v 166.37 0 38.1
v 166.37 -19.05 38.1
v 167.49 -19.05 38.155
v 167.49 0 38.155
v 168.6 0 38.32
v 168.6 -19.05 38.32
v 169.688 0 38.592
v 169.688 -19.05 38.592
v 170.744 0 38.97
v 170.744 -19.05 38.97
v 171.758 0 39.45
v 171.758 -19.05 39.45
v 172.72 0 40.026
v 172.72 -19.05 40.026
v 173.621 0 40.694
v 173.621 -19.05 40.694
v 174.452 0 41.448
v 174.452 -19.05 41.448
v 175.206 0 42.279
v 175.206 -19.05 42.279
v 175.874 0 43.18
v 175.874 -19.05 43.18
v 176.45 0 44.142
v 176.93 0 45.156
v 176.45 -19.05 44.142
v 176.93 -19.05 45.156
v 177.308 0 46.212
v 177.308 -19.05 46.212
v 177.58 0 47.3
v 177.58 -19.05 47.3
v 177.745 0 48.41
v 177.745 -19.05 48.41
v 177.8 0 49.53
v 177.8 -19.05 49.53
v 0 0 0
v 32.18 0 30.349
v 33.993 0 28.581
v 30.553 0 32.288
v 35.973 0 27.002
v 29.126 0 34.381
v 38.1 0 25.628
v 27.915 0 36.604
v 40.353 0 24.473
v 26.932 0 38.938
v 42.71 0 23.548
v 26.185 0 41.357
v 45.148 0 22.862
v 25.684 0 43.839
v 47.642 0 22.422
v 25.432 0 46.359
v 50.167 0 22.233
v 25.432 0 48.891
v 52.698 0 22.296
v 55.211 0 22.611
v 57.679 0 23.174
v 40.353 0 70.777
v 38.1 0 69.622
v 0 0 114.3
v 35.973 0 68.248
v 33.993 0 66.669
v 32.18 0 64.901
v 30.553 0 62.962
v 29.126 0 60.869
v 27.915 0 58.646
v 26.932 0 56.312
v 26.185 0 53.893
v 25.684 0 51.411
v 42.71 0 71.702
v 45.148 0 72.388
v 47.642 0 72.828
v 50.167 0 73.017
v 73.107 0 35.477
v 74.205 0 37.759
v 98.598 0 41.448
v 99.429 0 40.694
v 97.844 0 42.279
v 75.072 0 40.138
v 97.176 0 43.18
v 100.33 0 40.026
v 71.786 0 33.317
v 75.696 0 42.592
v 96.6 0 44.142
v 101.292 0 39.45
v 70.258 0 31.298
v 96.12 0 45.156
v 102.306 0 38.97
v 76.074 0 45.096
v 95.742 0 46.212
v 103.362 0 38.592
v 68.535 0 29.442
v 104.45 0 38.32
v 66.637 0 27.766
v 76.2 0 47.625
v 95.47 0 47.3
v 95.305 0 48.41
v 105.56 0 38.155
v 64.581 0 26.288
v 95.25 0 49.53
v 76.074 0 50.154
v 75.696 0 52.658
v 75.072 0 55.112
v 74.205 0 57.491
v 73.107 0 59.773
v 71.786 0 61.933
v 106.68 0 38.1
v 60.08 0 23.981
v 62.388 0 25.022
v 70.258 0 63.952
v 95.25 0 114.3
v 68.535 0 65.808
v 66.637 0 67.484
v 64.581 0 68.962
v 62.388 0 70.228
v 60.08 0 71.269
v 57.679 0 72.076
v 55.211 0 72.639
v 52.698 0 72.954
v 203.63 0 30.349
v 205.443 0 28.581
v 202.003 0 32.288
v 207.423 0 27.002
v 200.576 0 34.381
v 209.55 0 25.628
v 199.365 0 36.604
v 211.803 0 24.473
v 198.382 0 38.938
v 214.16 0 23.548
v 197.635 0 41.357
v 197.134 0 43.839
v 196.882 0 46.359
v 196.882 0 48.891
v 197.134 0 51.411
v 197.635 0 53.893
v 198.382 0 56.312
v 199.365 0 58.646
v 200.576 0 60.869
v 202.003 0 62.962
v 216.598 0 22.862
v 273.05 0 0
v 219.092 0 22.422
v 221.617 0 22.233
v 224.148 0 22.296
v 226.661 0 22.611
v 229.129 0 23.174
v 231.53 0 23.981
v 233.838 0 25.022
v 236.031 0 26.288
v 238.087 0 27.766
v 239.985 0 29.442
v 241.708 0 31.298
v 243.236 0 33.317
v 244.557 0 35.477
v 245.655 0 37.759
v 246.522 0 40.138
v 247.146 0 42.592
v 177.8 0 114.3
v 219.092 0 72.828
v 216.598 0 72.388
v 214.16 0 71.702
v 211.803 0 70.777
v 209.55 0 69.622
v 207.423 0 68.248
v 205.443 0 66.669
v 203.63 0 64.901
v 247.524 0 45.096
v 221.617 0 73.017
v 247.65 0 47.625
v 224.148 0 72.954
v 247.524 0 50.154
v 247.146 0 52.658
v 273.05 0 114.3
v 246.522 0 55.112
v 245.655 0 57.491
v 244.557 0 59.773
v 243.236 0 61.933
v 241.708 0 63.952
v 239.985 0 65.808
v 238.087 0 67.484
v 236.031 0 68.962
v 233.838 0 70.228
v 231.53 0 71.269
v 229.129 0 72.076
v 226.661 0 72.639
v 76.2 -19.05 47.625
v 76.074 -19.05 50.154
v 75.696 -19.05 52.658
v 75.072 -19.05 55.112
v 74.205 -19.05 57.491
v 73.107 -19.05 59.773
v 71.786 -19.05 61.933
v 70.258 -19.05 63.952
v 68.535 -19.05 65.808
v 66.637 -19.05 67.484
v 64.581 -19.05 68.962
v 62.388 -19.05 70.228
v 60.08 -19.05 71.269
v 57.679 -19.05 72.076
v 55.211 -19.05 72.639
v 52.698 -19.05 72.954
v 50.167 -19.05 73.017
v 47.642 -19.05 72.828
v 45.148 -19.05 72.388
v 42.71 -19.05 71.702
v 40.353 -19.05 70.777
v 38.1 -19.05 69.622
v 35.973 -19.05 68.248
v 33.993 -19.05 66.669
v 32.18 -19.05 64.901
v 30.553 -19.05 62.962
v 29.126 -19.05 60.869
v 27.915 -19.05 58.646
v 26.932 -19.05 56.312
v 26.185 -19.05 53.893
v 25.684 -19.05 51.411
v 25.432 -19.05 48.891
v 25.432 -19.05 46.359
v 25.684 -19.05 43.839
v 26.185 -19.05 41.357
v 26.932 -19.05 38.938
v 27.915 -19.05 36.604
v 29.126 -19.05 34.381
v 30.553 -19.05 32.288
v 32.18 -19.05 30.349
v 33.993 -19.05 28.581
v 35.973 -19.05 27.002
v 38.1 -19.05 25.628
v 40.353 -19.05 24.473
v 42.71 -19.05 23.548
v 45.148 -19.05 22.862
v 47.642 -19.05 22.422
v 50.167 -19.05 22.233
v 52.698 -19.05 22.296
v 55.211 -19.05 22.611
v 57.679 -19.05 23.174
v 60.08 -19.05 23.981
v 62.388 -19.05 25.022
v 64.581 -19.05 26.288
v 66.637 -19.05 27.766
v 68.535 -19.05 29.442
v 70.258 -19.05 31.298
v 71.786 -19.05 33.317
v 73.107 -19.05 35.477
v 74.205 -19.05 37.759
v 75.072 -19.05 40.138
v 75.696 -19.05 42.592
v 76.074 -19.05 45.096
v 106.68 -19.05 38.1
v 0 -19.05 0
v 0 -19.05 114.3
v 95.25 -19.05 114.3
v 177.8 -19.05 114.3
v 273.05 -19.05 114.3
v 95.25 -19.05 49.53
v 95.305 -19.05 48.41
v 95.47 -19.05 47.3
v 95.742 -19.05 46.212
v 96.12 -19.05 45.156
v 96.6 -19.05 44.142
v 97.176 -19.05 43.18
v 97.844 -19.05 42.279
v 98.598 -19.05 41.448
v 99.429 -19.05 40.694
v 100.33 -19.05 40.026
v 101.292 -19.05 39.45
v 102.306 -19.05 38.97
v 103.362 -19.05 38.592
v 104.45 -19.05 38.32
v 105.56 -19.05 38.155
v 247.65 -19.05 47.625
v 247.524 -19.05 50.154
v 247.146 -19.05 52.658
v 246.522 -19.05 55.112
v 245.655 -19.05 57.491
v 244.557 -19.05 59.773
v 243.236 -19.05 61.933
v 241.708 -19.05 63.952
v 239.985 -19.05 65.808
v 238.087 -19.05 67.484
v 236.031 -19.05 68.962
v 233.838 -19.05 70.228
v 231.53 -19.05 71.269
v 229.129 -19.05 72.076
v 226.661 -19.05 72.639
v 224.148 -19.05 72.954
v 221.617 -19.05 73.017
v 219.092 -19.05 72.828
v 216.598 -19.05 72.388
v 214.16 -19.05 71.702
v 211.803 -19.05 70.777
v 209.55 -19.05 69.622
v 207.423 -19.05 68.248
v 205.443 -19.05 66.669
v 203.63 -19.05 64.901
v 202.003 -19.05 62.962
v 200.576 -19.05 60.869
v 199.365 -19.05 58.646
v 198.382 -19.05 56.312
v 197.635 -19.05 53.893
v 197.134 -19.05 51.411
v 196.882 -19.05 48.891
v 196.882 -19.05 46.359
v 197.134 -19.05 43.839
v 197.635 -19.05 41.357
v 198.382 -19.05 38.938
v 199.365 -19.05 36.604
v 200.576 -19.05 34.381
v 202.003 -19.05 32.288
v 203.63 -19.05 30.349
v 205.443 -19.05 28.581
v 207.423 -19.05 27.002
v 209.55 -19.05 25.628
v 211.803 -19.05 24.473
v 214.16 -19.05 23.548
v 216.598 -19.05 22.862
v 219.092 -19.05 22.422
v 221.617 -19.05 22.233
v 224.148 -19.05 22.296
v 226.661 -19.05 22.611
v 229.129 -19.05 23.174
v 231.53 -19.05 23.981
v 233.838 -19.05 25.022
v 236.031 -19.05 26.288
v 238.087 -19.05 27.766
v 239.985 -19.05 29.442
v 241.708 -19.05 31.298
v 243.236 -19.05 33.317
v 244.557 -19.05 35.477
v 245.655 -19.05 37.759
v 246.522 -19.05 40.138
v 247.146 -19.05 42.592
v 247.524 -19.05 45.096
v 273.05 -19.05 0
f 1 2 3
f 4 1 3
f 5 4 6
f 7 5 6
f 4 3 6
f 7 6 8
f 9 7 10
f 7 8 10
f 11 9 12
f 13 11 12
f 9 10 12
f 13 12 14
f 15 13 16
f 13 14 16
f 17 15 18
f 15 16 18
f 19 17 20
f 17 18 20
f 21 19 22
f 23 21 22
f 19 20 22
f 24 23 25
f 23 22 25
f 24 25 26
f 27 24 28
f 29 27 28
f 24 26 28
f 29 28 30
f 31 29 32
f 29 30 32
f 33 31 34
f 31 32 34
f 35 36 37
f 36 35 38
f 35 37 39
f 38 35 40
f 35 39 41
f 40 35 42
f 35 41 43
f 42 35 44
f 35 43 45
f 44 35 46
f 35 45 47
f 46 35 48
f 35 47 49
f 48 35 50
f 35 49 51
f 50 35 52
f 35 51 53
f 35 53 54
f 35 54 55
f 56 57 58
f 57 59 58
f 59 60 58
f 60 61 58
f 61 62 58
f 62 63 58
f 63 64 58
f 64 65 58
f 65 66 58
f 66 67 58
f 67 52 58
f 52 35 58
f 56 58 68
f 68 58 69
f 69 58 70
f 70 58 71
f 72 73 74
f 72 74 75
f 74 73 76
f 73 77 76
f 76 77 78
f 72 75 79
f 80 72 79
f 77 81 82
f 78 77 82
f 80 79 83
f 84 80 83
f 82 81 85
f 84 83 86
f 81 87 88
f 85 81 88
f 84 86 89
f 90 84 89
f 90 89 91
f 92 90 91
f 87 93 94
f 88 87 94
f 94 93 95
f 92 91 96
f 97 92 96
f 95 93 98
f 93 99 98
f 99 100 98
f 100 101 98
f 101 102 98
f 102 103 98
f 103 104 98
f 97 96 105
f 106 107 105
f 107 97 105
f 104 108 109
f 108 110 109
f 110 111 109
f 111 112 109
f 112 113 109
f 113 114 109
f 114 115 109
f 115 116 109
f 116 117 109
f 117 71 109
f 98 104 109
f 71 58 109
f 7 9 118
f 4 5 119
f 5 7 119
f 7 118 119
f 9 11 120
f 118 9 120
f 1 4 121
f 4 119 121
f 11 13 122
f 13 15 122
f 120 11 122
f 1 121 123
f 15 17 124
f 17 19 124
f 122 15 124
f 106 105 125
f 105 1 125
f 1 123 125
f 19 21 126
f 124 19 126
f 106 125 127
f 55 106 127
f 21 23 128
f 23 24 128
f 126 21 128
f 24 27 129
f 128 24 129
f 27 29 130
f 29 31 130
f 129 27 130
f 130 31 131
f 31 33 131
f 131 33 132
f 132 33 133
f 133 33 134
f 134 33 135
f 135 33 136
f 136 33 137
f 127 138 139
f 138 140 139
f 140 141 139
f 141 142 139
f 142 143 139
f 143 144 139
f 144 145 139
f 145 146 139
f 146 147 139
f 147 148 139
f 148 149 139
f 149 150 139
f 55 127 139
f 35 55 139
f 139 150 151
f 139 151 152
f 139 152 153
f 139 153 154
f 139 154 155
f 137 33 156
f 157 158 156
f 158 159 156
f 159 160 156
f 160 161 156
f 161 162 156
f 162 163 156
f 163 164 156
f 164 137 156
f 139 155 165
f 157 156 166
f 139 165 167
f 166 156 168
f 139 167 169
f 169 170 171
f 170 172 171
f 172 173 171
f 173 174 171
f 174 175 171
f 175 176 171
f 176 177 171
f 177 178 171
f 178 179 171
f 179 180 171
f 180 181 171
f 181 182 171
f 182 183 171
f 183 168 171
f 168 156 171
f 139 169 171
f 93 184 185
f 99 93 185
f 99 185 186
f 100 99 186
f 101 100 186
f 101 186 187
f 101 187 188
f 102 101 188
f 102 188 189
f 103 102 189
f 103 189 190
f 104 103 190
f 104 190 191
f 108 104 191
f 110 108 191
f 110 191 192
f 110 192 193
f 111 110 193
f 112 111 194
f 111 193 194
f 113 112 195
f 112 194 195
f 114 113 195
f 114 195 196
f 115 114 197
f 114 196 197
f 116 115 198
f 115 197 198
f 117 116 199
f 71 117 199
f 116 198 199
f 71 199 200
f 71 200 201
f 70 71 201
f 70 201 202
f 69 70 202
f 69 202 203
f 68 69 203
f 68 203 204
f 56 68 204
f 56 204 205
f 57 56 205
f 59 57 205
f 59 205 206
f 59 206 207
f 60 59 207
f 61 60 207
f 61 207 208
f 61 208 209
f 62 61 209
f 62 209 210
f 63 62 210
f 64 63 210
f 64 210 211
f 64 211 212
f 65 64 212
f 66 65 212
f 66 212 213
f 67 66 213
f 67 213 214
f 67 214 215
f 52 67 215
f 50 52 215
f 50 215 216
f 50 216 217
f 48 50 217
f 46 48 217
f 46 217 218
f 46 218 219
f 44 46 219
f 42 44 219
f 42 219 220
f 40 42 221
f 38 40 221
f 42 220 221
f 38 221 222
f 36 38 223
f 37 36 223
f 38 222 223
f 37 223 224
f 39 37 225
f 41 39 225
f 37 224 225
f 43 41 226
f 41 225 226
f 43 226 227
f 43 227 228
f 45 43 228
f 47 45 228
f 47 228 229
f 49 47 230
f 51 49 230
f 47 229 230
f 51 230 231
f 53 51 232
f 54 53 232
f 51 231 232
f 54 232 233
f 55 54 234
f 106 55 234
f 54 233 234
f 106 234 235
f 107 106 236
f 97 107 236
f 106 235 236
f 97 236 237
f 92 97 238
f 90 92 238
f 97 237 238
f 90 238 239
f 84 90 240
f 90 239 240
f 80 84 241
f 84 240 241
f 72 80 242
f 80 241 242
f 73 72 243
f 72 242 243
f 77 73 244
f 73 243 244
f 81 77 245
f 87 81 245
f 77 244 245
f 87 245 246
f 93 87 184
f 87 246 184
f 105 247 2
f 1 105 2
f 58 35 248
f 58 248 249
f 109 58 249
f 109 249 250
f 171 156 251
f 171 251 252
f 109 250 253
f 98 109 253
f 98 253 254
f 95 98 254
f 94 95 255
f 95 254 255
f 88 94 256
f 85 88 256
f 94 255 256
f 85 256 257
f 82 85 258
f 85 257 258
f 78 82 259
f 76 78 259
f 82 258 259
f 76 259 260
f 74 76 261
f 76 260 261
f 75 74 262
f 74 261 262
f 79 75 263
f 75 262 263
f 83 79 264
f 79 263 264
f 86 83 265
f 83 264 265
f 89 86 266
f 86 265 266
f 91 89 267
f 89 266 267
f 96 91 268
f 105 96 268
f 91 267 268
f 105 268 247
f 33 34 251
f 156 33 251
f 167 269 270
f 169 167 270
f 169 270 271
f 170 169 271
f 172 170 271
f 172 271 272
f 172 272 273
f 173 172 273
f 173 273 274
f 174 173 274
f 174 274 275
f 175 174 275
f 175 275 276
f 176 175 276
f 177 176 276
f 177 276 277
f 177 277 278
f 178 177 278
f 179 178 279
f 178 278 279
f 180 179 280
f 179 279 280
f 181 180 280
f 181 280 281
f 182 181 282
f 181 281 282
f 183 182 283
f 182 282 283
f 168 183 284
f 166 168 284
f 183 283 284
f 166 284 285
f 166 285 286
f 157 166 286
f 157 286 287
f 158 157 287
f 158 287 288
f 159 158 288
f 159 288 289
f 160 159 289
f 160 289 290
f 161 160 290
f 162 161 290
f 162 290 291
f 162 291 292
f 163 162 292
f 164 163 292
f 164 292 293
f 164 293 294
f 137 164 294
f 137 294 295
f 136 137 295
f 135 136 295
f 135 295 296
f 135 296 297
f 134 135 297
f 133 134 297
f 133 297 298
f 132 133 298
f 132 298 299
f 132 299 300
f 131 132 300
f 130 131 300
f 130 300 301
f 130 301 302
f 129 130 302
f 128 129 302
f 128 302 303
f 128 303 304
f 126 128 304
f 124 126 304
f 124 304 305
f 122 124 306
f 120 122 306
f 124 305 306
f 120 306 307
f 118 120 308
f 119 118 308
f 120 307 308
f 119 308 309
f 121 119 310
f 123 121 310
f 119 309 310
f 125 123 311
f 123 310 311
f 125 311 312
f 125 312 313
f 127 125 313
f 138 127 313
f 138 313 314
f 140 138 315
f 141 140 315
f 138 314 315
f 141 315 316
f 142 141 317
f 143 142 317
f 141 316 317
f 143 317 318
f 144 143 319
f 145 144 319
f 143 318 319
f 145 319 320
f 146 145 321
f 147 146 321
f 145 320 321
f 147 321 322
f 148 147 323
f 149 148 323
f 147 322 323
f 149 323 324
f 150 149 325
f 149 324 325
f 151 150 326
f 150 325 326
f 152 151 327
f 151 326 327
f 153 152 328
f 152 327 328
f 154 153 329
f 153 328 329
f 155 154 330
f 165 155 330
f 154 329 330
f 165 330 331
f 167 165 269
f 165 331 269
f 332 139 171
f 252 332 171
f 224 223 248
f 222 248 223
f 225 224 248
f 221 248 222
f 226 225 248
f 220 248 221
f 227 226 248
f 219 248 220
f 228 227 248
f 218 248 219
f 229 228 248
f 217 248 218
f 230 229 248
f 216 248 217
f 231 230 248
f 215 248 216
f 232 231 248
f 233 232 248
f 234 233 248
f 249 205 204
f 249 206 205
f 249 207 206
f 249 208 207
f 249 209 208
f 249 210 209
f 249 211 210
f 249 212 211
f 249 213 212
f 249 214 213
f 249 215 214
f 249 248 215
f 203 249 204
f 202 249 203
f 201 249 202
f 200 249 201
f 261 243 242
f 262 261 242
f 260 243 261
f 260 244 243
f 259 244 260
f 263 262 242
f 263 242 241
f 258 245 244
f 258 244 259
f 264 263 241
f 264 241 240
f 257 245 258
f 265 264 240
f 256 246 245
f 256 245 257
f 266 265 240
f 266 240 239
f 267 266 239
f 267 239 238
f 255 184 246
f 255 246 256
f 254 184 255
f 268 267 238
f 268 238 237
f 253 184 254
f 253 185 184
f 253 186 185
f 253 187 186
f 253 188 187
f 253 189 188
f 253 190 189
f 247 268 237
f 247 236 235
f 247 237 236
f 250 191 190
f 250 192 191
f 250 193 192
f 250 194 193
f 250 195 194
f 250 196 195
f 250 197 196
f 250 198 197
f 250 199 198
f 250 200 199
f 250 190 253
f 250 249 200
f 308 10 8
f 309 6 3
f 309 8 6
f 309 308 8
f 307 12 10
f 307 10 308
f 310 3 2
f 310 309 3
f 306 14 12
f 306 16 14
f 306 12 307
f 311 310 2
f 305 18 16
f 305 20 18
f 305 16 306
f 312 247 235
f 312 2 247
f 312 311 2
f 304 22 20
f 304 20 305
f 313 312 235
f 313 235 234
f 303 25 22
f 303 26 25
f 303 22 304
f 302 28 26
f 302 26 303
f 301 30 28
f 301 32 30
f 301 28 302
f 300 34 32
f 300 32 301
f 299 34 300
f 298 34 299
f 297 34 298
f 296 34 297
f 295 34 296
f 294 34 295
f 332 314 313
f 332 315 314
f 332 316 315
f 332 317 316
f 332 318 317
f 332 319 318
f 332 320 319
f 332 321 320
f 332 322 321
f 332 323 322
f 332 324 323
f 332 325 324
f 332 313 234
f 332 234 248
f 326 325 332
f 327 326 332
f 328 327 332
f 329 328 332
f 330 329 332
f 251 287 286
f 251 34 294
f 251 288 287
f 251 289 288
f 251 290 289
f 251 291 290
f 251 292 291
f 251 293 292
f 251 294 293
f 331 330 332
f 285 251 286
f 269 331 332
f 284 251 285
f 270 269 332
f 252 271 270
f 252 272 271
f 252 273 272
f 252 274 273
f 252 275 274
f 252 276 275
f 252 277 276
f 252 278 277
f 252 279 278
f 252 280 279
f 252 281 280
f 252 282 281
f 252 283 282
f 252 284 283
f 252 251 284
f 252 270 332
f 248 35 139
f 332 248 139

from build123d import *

# Parameters (mm, degrees)
F0_W     = 273.05
F0_H     = 114.3
F1_DEPTH = 19.05
F2_R     = 25.4
F3_DEPTH = 25.4
F5_DEPTH = 25.4


with BuildPart() as f1:
    # F0 (on Front) → F1 (new body)
    with BuildSketch(Plane.XZ):
        with Locations((136.525, 57.15)):
            Rectangle(F0_W, F0_H)
    extrude(amount=F1_DEPTH)

    # F2 (on face) → F3 (cut)
    with BuildSketch(Plane.XZ.offset(19.05)):
        with Locations((222.25, 47.625)):
            Circle(F2_R)
        with Locations((50.8, 47.625)):
            Circle(F2_R)
    extrude(amount=-F3_DEPTH, mode=Mode.SUBTRACT)

    # F4 (on face) → F5 (cut)
    with BuildSketch(Plane.XZ.offset(19.05)):
        with BuildLine():
            Line((177.8, 114.3), (95.25, 114.3))
            Line((95.25, 114.3), (95.25, 49.53))
            ThreePointArc((95.25, 49.53), (98.597769, 41.447769), (106.68, 38.1))
            Line((106.68, 38.1), (166.37, 38.1))
            ThreePointArc((166.37, 38.1), (174.452231, 41.447769), (177.8, 49.53))
            Line((177.8, 49.53), (177.8, 114.3))
        make_face()
    extrude(amount=-F5_DEPTH, mode=Mode.SUBTRACT)


solid = f1.part
